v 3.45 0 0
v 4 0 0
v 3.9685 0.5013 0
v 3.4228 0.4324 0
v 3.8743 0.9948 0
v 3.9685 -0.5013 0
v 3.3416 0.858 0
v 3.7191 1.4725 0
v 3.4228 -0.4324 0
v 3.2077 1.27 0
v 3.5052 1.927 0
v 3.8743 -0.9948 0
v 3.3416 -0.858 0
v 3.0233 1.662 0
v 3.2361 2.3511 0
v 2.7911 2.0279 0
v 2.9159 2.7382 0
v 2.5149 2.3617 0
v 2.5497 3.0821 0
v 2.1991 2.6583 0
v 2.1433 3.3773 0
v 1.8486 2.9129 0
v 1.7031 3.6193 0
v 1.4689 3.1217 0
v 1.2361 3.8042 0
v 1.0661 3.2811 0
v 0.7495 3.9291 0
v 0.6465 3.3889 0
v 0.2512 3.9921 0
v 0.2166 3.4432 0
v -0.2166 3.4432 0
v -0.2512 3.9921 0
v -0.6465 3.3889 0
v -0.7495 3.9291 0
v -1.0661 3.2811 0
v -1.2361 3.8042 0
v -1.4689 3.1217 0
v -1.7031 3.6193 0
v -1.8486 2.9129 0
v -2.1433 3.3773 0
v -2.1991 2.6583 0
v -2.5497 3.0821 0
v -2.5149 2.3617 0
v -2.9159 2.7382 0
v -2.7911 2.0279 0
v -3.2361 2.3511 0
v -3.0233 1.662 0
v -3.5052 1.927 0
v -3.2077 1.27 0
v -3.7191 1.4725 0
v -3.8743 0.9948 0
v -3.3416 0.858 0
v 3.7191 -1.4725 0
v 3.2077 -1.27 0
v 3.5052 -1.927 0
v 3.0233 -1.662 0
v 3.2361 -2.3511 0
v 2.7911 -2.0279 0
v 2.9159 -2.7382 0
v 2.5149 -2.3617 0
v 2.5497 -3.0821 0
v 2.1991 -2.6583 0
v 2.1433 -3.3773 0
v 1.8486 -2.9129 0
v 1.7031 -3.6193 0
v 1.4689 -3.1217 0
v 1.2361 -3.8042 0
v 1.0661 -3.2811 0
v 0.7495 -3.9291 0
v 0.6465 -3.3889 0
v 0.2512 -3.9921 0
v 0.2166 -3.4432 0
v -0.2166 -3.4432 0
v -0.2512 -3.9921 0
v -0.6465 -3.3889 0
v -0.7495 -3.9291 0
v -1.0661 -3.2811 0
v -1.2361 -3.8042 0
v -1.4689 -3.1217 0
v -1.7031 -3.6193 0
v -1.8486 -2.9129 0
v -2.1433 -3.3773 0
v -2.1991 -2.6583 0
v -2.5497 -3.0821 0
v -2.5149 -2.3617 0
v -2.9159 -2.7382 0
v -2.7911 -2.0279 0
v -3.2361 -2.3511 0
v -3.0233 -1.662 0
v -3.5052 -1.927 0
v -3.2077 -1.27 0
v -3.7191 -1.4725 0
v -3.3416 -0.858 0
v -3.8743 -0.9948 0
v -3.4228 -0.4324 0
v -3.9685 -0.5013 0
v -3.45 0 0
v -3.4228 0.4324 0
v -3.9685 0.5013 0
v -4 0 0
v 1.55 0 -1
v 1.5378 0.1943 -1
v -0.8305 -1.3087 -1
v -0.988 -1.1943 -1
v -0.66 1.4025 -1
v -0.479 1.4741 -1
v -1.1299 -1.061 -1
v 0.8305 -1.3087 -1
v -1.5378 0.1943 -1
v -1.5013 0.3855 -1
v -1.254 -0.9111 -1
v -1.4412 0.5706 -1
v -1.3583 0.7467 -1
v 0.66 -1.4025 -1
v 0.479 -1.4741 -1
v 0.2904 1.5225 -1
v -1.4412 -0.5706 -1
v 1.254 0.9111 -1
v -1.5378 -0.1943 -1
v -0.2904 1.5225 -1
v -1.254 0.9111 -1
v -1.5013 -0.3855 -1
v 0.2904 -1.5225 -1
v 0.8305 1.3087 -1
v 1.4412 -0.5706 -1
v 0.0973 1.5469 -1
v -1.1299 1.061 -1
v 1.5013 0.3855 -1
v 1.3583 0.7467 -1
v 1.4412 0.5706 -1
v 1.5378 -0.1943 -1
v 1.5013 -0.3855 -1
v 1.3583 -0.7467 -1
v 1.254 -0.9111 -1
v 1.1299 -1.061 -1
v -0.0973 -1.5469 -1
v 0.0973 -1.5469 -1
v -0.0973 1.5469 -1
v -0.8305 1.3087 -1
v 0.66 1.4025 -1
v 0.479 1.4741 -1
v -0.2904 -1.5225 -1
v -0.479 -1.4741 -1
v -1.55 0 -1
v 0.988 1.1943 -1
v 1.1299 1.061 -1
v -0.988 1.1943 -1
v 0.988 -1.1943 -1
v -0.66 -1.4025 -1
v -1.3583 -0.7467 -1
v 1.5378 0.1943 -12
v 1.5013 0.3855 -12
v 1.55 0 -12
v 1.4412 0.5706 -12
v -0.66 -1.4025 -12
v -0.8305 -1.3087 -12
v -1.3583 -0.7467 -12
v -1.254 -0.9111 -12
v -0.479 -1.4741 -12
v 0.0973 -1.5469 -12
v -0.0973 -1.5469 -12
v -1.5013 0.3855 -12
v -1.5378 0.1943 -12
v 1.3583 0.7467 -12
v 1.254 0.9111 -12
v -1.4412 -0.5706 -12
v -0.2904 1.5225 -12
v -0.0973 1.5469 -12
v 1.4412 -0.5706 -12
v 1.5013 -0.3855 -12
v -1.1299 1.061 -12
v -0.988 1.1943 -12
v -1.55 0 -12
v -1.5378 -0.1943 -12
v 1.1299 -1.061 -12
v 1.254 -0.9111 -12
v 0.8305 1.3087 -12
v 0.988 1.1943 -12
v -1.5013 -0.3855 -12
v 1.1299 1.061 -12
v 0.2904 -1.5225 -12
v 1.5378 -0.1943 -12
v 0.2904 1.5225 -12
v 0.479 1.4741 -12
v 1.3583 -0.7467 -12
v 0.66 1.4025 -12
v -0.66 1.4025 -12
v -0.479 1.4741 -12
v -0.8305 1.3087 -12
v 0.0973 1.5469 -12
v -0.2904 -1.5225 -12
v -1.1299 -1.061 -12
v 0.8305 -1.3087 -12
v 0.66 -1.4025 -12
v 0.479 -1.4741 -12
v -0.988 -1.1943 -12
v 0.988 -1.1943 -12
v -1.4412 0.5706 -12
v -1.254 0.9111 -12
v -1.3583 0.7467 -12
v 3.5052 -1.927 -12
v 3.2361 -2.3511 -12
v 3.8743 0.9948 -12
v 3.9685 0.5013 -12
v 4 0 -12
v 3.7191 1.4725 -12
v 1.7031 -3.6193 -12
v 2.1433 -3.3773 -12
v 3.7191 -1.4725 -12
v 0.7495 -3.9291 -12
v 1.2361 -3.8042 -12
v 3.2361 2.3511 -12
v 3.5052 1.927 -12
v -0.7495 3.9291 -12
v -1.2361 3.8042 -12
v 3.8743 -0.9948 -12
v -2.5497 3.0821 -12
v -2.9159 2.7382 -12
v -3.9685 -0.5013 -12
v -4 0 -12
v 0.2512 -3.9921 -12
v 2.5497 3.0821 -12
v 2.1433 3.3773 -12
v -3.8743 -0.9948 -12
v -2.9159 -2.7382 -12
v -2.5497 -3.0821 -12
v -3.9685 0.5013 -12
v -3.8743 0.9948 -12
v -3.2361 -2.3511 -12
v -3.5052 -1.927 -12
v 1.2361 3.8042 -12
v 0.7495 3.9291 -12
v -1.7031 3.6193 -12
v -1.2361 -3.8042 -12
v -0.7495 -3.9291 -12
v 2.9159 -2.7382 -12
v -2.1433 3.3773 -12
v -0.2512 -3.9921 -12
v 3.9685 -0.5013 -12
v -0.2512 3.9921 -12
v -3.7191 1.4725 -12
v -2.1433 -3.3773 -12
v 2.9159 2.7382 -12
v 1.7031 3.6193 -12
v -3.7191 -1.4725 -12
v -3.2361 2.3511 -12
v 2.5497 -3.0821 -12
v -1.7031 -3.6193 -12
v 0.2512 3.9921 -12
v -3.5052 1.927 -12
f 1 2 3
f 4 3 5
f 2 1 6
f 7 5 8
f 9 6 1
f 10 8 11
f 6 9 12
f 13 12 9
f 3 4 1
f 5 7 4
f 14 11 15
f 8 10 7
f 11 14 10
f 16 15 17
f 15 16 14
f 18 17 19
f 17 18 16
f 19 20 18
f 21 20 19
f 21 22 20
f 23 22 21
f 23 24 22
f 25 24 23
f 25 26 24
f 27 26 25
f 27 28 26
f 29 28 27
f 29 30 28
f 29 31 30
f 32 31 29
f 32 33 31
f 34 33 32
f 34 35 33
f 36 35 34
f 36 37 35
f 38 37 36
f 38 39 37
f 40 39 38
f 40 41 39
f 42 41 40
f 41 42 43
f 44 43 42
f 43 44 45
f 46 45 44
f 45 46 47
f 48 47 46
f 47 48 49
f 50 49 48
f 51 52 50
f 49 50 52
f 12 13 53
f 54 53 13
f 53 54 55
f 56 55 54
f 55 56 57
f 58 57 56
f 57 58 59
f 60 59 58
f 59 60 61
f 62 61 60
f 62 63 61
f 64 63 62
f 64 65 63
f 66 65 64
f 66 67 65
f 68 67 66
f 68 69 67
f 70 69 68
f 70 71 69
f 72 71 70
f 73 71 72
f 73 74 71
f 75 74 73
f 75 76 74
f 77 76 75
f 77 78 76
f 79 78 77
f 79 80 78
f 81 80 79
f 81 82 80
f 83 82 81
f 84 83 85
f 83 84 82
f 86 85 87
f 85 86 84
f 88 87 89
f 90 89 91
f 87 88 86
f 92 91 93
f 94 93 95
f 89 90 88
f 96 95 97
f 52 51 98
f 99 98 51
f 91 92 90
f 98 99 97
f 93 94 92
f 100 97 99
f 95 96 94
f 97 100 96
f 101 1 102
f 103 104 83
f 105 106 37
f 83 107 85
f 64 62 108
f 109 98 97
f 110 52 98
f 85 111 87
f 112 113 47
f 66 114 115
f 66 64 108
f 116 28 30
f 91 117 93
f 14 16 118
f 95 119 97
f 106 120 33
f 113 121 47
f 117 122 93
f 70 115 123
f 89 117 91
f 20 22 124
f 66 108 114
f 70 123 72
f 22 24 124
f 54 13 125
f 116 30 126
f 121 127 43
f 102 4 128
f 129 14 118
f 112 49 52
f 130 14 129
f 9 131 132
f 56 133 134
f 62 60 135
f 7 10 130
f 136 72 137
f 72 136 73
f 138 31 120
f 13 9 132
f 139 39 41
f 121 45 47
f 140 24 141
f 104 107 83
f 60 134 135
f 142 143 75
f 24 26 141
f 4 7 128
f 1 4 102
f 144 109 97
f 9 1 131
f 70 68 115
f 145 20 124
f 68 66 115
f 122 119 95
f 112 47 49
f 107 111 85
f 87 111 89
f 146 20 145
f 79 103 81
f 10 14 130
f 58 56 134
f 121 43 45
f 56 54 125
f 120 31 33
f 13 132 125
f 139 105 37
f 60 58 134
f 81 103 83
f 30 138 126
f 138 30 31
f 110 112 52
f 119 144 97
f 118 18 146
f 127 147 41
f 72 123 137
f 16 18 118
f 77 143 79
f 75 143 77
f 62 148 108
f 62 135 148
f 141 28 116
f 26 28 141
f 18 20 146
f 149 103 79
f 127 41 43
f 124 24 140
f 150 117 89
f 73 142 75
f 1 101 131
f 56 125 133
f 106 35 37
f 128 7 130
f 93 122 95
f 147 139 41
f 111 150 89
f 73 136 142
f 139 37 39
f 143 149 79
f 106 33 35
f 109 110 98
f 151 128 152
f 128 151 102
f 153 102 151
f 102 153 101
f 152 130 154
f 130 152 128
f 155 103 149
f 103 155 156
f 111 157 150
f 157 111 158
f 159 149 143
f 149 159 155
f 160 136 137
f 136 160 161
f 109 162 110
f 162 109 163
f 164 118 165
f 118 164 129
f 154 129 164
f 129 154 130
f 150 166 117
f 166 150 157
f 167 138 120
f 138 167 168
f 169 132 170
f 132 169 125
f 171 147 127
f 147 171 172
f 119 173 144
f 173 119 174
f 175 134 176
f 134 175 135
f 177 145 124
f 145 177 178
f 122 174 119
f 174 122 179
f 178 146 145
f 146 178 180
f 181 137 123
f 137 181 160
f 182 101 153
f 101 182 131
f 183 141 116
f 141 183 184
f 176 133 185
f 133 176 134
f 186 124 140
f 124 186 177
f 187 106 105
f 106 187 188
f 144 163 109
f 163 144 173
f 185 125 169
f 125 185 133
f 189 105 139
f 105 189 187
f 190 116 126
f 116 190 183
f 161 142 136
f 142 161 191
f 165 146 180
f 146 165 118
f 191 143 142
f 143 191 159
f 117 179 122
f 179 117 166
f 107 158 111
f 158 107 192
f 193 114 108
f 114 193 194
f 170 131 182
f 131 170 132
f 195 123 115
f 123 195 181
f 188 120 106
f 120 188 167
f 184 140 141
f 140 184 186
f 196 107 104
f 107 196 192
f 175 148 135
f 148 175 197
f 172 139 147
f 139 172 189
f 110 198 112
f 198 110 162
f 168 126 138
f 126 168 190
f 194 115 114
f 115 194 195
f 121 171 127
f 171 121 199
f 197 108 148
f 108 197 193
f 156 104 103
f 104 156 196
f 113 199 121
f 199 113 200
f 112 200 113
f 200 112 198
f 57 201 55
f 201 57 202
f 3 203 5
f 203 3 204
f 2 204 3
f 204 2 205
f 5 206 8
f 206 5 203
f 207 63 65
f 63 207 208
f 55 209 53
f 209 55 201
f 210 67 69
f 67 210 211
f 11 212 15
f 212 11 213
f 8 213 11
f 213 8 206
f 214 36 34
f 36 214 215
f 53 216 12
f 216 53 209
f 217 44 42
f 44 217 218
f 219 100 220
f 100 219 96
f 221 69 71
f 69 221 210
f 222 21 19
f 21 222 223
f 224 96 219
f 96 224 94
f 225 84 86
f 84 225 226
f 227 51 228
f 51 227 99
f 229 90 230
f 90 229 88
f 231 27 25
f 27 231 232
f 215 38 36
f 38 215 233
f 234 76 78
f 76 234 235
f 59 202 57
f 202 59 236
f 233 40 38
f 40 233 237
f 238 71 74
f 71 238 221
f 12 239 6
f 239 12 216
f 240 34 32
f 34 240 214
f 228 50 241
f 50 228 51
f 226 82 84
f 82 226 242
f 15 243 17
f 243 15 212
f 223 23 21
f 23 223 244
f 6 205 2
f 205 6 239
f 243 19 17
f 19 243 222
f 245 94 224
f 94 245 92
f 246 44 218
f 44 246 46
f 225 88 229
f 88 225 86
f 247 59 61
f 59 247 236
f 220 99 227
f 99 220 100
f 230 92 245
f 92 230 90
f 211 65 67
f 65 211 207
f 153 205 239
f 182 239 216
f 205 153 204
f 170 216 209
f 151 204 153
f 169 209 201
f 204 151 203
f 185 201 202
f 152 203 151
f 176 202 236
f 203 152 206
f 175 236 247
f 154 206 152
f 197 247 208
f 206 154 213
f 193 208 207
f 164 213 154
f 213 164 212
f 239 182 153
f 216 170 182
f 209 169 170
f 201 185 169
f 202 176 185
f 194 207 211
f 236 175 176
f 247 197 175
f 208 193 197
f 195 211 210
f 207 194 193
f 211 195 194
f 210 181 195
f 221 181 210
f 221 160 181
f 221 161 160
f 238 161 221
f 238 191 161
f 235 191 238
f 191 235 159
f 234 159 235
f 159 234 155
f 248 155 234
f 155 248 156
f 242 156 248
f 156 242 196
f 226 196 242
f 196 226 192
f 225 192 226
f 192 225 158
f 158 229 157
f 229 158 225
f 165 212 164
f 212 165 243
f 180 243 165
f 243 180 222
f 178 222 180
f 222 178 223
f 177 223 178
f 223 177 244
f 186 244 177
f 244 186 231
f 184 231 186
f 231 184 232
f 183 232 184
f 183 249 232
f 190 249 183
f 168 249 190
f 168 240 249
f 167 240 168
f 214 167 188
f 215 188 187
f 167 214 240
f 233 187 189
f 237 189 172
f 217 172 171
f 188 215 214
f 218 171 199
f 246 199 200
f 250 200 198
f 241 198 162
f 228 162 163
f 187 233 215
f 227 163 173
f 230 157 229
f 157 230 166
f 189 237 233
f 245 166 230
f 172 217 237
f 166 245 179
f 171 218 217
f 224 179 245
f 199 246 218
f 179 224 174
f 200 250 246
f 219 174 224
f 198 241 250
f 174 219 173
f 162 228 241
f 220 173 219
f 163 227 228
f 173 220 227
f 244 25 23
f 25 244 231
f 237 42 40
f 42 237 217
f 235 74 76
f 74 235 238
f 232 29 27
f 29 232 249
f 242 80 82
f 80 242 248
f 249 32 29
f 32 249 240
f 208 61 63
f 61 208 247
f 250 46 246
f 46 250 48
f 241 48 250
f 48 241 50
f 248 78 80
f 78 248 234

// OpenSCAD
$fn = 50;

difference() {
	union() {
		translate(v = [0, 0, -12.0]) {
			cylinder(h = 12, r = 4.0);
		}
	}
	union() {
		translate(v = [0, 0, 0]) {
			rotate(a = [0, 0, 0]) {
				difference() {
					union() {
						translate(v = [0, 0, -15.0]) {
							cylinder(h = 15, r = 1.25);
						}
						translate(v = [0, 0, -1.0]) {
							cylinder(h = 1.0, r1 = 1.55, r2 = 3.45);
						}
						translate(v = [0, 0, -15.0]) {
							cylinder(h = 15, r = 1.55);
						}
						translate(v = [0, 0, -15.0]) {
							cylinder(h = 15, r = 1.25);
						}
					}
					union();
				}
			}
		}
	}
}
